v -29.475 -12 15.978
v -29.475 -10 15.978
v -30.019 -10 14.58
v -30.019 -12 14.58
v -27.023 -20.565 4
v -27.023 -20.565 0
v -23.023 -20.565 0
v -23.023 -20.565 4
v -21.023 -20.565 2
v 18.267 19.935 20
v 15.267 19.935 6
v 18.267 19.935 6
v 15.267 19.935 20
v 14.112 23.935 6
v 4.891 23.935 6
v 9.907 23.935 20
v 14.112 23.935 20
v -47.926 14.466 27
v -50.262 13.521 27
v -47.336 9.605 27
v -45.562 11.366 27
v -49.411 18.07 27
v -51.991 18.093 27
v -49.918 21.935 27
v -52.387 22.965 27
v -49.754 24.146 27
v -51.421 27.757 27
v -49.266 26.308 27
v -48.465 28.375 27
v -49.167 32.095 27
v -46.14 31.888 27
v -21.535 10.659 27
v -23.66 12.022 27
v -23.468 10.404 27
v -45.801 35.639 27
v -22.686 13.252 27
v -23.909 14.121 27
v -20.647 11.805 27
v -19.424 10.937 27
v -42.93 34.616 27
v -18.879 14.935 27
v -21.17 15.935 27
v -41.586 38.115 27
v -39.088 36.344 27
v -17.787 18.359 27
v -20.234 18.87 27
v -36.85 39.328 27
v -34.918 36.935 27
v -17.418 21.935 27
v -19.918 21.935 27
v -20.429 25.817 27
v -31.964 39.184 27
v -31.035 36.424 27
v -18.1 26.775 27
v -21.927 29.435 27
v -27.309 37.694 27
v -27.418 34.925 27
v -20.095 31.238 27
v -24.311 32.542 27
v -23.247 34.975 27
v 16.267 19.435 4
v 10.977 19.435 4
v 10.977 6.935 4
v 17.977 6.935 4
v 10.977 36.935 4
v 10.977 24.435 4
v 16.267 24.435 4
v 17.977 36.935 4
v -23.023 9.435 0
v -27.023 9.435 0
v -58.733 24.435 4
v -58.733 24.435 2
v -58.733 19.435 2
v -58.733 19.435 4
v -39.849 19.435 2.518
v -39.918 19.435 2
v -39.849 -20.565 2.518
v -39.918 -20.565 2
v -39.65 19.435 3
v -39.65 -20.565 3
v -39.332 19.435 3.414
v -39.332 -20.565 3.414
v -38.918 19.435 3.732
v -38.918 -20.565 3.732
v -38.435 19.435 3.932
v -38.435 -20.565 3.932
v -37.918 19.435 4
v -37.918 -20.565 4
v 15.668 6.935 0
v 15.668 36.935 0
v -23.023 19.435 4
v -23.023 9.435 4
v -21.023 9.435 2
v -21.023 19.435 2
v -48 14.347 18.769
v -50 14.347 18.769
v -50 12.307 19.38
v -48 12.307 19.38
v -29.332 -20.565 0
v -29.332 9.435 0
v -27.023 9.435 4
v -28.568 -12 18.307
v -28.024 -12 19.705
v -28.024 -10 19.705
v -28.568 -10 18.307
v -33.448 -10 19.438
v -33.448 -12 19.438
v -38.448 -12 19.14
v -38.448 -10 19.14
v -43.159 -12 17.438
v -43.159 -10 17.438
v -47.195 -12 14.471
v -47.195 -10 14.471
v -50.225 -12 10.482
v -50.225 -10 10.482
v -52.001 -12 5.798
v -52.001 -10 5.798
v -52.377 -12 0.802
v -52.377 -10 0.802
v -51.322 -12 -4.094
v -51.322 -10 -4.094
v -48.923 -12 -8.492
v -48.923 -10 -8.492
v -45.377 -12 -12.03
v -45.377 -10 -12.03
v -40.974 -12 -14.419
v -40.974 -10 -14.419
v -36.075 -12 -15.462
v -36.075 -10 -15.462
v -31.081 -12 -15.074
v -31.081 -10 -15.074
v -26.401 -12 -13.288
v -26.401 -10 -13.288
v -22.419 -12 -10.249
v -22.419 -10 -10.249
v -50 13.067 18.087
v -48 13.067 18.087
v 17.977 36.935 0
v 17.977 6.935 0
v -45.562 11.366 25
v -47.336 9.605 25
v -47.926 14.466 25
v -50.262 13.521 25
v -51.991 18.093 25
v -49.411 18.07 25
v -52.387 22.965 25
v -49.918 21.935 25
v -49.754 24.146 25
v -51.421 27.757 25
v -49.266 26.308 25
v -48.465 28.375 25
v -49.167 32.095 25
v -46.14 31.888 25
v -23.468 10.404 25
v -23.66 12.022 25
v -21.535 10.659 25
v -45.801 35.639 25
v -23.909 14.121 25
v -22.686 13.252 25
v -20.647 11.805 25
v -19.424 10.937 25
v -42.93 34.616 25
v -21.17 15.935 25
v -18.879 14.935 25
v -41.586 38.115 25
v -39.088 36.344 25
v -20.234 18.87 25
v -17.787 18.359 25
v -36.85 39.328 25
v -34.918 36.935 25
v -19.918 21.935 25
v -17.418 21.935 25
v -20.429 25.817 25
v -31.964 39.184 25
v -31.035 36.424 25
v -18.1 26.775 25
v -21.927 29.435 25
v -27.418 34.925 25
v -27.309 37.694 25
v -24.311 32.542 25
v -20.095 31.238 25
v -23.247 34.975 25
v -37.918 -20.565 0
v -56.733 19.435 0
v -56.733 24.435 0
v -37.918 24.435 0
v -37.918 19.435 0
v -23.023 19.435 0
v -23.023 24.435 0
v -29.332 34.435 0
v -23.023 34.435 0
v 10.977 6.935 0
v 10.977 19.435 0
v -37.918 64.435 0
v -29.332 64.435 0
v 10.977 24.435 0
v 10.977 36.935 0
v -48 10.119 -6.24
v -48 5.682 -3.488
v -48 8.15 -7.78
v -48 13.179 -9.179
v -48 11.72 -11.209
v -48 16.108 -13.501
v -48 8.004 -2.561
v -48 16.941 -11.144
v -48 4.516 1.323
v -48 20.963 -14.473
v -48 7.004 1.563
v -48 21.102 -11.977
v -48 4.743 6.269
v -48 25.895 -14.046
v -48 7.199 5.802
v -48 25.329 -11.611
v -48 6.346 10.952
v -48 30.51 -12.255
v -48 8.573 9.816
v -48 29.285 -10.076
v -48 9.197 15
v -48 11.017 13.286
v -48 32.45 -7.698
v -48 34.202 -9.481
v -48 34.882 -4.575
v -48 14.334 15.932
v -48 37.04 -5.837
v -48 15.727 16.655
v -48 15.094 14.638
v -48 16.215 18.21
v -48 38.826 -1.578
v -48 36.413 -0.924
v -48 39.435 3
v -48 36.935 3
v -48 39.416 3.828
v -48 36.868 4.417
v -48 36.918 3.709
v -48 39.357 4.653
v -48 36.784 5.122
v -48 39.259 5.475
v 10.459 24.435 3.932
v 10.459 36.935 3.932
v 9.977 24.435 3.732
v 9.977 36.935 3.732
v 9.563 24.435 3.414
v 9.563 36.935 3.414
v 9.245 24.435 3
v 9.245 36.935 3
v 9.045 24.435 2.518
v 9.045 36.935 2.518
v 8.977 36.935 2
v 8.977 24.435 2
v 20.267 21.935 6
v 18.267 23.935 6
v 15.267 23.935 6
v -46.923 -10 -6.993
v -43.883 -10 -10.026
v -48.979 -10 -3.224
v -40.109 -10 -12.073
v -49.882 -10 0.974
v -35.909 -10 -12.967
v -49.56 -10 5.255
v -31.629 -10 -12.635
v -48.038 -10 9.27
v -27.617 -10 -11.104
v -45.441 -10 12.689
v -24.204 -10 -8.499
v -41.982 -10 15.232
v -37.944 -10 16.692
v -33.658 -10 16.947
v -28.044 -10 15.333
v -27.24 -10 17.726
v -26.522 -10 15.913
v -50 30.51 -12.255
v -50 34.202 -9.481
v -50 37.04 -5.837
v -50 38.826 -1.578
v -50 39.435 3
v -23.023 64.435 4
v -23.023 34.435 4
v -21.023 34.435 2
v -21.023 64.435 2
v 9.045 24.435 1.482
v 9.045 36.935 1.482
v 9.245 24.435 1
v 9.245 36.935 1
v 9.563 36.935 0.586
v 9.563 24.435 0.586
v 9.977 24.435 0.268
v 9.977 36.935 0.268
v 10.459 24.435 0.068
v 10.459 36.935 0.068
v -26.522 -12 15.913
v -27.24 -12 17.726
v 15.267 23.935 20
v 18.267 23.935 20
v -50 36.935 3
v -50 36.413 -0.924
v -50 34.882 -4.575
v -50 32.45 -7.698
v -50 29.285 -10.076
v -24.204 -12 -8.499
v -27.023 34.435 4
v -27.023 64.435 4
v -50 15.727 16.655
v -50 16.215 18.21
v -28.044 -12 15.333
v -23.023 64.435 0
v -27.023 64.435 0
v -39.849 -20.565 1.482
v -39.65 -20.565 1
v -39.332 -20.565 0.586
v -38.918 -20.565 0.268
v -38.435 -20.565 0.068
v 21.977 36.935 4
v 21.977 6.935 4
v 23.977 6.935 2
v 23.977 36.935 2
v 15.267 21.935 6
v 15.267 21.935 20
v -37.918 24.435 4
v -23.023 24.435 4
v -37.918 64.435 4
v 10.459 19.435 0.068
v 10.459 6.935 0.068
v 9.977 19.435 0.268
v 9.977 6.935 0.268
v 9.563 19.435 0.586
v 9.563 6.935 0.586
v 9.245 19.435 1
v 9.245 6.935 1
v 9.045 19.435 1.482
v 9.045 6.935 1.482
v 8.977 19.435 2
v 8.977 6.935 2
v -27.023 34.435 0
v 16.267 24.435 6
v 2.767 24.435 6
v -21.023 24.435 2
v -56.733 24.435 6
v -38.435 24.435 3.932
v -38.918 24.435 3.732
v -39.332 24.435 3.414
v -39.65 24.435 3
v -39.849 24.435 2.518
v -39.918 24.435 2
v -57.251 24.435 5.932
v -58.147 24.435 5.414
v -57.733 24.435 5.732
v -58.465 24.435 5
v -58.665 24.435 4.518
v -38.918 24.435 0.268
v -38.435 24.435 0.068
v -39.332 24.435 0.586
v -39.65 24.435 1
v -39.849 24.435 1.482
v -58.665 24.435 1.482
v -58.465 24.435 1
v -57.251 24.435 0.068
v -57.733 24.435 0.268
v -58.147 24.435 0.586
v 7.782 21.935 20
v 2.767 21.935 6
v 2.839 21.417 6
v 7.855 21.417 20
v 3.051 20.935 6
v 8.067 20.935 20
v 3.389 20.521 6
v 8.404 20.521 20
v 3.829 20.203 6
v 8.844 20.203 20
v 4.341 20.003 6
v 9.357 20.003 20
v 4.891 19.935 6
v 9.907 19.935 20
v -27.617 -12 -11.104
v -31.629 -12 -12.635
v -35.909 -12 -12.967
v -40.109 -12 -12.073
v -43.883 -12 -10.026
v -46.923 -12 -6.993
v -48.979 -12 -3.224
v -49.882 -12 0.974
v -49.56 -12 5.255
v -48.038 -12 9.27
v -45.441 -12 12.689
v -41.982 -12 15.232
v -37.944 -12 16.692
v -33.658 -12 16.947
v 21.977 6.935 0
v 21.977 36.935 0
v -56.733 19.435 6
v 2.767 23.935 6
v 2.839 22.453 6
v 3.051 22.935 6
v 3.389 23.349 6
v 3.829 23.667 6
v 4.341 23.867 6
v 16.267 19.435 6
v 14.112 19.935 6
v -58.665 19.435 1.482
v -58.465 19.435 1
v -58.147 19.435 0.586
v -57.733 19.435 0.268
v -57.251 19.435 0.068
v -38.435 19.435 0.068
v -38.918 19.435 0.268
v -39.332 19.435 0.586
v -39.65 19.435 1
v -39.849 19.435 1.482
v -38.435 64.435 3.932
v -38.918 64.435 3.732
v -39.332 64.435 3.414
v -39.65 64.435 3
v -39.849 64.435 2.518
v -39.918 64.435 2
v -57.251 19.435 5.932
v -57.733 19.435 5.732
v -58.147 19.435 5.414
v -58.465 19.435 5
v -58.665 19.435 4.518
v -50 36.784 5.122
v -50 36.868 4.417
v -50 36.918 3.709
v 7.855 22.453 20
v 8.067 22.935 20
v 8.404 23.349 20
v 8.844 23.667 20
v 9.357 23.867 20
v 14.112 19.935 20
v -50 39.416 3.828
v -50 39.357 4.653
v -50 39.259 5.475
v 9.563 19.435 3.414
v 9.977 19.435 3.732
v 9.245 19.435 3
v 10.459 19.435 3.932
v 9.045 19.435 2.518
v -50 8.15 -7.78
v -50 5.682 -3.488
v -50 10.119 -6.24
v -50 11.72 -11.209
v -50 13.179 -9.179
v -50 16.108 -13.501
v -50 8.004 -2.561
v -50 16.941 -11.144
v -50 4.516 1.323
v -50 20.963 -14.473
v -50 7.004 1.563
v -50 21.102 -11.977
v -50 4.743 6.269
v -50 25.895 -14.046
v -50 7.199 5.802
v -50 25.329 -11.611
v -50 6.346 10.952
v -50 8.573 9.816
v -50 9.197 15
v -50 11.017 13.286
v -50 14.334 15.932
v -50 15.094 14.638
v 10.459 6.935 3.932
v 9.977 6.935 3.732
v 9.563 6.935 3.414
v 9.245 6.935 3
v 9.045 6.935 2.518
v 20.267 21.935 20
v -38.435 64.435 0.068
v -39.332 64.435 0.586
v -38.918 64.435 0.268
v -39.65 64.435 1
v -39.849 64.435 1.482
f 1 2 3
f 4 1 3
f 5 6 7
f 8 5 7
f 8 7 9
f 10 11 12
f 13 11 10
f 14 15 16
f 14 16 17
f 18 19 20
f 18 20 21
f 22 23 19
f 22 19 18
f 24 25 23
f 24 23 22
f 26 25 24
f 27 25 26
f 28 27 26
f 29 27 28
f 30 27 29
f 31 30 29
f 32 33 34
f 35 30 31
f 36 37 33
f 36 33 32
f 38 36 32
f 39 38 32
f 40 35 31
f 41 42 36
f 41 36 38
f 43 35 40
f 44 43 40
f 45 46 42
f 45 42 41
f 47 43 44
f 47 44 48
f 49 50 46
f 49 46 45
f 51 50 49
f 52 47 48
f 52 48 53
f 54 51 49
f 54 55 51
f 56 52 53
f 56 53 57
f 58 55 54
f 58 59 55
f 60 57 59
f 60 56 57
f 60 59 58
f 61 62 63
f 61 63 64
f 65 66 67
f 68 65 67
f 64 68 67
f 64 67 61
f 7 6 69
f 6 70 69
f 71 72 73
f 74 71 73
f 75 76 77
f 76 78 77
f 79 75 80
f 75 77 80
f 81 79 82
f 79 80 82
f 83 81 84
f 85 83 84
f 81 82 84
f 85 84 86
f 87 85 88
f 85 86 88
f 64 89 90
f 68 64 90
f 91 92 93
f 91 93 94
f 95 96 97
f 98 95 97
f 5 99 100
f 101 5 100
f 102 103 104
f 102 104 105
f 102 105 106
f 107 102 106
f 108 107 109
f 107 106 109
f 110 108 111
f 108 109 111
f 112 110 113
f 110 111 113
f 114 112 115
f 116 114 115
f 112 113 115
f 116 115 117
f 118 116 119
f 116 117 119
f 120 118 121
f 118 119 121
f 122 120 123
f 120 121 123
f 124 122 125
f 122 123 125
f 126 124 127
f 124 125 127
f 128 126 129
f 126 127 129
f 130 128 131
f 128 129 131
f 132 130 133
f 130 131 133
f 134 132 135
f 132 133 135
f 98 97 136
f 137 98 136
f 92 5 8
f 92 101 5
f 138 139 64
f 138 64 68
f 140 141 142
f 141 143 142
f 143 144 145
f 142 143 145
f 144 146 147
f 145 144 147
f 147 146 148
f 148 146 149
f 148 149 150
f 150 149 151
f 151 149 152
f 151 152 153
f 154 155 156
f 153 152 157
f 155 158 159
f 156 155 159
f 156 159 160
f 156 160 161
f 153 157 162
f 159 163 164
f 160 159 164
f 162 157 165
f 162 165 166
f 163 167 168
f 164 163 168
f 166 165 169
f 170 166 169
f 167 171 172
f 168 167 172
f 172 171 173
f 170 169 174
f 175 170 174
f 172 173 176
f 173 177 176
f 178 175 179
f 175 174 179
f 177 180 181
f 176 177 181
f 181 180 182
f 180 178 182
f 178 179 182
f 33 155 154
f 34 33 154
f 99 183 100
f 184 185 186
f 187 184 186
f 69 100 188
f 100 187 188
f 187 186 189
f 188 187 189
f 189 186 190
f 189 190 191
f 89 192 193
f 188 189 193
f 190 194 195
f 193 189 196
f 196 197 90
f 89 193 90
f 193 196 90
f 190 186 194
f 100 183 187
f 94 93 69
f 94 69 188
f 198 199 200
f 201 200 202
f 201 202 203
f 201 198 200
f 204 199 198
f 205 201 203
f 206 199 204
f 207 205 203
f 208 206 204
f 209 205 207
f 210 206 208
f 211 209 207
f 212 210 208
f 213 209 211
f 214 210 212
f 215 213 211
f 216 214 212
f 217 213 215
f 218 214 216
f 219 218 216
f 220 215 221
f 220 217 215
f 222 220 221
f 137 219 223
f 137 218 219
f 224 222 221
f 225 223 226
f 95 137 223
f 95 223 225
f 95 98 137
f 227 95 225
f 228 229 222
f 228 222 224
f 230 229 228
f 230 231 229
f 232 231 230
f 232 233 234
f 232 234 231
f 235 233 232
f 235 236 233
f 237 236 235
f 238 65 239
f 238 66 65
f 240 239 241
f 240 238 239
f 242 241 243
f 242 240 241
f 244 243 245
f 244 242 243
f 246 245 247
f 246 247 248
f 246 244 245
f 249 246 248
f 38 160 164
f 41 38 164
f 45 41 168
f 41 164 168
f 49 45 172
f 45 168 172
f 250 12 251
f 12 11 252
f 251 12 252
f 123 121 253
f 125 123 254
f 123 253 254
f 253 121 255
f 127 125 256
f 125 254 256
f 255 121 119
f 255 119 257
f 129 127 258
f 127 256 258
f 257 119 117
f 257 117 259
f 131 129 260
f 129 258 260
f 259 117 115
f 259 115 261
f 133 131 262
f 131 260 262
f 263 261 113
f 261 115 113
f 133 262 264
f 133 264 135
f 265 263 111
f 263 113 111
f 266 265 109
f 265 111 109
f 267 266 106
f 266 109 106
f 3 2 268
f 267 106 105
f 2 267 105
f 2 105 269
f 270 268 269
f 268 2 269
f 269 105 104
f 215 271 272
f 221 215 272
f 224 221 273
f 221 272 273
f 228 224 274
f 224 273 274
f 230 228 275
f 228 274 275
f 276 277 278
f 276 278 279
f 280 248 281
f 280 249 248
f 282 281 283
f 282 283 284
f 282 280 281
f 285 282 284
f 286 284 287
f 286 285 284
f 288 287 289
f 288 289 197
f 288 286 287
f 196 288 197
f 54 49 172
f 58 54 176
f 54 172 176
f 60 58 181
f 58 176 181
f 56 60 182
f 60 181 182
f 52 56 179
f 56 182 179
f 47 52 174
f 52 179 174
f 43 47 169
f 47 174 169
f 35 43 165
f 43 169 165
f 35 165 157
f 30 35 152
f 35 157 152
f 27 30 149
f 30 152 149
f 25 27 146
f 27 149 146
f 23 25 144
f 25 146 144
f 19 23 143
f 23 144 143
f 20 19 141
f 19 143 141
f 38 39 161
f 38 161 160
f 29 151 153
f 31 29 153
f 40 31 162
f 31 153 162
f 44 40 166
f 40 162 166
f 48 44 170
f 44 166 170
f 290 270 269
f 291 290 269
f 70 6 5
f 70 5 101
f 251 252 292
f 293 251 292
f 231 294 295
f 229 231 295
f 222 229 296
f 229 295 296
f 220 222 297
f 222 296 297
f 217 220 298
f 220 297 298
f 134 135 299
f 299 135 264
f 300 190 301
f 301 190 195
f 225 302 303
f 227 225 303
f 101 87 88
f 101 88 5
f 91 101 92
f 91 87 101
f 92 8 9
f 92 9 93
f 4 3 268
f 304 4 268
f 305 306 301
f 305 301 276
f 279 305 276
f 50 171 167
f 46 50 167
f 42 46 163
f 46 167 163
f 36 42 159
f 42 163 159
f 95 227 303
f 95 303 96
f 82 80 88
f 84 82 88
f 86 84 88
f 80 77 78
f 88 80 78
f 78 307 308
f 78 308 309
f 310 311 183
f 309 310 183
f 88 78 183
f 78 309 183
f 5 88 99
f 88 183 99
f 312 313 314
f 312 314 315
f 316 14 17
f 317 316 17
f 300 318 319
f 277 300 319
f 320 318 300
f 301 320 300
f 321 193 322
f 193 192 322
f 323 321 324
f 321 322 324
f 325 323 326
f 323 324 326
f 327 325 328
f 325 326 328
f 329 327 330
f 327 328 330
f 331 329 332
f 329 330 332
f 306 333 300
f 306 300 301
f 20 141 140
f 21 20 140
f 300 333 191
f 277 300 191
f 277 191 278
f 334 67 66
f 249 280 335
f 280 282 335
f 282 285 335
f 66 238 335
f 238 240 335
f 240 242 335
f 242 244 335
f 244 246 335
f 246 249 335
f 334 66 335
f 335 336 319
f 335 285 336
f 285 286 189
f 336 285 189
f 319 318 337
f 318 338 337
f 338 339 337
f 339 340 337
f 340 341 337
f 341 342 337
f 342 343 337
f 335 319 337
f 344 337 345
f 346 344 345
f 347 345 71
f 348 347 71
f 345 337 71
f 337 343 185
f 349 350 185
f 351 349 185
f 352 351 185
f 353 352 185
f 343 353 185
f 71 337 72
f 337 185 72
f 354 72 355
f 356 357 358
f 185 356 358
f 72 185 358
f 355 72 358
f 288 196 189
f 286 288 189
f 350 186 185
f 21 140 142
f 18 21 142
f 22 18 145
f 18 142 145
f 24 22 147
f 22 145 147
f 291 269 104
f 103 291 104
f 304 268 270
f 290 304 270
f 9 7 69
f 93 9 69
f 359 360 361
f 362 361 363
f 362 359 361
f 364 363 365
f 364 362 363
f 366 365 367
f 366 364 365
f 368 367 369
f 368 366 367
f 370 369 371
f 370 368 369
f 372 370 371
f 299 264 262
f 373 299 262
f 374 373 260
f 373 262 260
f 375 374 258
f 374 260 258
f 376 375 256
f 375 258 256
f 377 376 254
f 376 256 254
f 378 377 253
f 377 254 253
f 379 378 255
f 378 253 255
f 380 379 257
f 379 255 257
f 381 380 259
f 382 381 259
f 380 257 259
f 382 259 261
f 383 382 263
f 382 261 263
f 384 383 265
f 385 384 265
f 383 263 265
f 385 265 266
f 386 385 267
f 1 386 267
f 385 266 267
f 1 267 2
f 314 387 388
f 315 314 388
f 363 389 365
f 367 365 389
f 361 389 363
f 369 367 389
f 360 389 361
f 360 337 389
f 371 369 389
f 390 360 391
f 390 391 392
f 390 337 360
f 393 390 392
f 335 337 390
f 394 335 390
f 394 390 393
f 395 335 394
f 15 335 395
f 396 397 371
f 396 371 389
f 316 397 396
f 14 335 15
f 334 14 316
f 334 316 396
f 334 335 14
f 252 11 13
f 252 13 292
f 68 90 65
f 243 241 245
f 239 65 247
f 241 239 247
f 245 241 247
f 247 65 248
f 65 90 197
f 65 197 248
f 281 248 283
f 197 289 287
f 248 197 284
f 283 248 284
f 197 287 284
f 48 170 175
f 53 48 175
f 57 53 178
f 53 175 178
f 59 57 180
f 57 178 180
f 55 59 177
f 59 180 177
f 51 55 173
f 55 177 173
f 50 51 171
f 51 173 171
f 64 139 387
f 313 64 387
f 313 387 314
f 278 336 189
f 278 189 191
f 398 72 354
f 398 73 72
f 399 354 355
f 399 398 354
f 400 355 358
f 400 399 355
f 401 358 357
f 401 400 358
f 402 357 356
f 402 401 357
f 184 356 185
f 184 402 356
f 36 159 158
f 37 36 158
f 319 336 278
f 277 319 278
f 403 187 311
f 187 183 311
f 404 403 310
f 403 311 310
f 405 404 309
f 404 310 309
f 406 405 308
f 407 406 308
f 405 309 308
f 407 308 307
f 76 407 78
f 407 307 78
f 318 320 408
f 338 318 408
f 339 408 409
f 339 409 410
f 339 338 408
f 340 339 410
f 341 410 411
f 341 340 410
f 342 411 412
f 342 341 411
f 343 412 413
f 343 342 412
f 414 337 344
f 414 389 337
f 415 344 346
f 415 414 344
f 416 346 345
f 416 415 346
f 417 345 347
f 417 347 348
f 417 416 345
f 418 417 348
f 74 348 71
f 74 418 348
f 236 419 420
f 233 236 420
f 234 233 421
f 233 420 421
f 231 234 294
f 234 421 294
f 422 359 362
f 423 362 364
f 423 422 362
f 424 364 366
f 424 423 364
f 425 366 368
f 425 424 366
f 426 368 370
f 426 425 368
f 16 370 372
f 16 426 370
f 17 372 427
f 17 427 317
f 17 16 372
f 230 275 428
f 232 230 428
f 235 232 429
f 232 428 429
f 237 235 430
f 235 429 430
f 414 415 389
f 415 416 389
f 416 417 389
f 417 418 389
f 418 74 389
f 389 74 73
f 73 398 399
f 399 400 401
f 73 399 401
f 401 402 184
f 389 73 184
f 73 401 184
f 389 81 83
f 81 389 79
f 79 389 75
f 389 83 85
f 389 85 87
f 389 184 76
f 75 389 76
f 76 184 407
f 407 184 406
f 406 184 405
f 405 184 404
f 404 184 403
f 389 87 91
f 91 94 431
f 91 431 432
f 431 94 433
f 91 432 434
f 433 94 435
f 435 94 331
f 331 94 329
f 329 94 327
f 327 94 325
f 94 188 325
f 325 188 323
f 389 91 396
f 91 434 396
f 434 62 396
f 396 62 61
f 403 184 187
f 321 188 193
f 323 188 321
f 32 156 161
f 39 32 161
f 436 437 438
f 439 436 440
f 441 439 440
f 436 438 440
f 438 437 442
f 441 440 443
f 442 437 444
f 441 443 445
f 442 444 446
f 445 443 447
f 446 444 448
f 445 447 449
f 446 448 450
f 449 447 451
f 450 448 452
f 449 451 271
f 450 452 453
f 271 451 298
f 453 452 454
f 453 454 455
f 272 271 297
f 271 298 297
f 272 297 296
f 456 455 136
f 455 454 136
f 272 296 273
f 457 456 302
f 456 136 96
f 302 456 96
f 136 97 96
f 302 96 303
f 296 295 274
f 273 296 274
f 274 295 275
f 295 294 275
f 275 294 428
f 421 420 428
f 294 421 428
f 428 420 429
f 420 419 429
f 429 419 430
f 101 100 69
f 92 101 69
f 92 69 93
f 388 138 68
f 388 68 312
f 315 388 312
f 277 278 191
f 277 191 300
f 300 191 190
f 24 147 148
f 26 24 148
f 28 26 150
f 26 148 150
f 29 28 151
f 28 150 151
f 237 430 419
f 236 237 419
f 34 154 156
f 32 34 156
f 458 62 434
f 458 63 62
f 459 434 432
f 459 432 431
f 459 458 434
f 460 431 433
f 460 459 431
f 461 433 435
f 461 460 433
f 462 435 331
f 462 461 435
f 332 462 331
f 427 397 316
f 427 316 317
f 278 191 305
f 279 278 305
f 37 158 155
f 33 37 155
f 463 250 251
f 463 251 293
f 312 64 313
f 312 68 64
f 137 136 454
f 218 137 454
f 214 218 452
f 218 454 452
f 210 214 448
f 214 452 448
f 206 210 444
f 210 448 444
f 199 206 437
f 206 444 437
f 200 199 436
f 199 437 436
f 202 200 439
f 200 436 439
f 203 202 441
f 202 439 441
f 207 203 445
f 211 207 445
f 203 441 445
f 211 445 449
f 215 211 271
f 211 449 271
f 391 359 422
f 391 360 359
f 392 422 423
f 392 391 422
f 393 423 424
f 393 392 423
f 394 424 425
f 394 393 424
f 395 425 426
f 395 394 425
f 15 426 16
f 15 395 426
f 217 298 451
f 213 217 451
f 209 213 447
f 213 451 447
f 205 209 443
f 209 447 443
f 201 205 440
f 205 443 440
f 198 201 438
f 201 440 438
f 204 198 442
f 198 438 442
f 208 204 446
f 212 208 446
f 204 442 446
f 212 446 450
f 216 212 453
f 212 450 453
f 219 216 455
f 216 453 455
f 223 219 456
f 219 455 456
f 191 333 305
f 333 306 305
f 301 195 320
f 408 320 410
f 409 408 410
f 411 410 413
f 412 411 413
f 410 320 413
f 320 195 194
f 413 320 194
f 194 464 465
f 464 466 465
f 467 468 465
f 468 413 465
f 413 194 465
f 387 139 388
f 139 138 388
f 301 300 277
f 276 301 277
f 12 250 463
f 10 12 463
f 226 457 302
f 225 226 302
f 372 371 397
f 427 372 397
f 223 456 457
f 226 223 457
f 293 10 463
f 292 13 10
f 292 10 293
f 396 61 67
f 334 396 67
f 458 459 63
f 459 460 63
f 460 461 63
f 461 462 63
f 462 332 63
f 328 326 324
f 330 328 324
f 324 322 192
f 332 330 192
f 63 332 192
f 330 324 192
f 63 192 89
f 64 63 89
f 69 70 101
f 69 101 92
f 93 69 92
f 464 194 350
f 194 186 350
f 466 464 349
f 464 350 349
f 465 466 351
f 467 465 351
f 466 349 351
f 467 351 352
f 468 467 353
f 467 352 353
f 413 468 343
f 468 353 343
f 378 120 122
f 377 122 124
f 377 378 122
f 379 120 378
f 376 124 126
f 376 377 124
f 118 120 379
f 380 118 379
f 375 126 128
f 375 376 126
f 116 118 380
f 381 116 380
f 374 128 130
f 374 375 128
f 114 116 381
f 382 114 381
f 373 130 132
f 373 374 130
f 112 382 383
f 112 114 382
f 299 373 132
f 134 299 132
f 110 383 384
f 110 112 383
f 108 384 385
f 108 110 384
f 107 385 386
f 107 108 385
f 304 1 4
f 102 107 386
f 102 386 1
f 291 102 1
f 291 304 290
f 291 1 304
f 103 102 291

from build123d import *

# Parameters (mm, degrees)
F0_W        = 12.5
F0_H        = 4
F1_DEPTH    = 6
F2_DEPTH    = 4
F0_W_2      = 6
F0_H_2      = 30
F3_DEPTH    = 4
F4_DEPTH    = 20
F7_DEPTH    = 25
F8_DEPTH    = 5
F9_R        = 1.99999
F10_SIZE    = 1.99999
F10_2_SIZE  = 1.99999
F10_3_SIZE  = 1.99999
F10_4_SIZE  = 1.99999
F10_5_SIZE  = 1.99999
F11_SIZE2   = 2.309391
F11_SIZE    = 3.99999
F11_2_SIZE2 = 2.309391
F11_2_SIZE  = 3.99999
F11_3_SIZE2 = 2.309391
F11_3_SIZE  = 3.99999
F12_SIZE2   = 1.154691
F12_SIZE    = 1.99999
F15_DEPTH   = 2
F18_DEPTH   = 2
F21_DEPTH   = 2


# Not quite as in the source:
# - a fillet or chamfer is up to 0.001 mm smaller than in the source, because OpenCascade refuses the exact size


with BuildPart() as f1:
    # F0 (on Top) → F1 (new body)
    with BuildSketch(Plane.XY):
        Polygon((-58.7332326337, 24.4351043343), (-58.7332326337, 19.4351043343), (-39.9175214512, 19.4351043343), (-21.0230639726, 19.4351043343), (8.9769360274, 19.4351043343), (16.2667673663, 19.4351043343), (16.2667673663, 24.4351043343), (8.9769360274, 24.4351043343), (-21.0230639726, 24.4351043343), (-39.9175214512, 24.4351043343), align=None)
        with Locations((9.0167673663, 21.9351043343)):
            Rectangle(F0_W, F0_H, mode=Mode.SUBTRACT)
    extrude(amount=F1_DEPTH)

    # F0 (on Top) → F2 (join)
    with BuildSketch(Plane.XY):
        Polygon((-21.0230639726, 19.4351043343), (-39.9175214512, 19.4351043343), (-39.9175214512, -20.5648956657), (-27.0230639726, -20.5648956657), (-27.0230639726, 9.4351043343), (-21.0230639726, 9.4351043343), align=None)
        Polygon((-39.9175214512, 64.4351043343), (-39.9175214512, 24.4351043343), (-21.0230639726, 24.4351043343), (-21.0230639726, 34.4351043343), (-27.0230639726, 34.4351043343), (-27.0230639726, 64.4351043343), align=None)
        Polygon((16.2667673663, 19.4351043343), (8.9769360274, 19.4351043343), (8.9769360274, 6.9351043343), (17.9769360274, 6.9351043343), (17.9769360274, 36.9351043343), (8.9769360274, 36.9351043343), (8.9769360274, 24.4351043343), (16.2667673663, 24.4351043343), align=None)
    extrude(amount=F2_DEPTH)

    # F0 (on Top) → F4 (join)
    with BuildSketch(Plane.XY):
        with Locations((9.0167673663, 21.9351043343)):
            Rectangle(F0_W, F0_H)
    extrude(amount=F4_DEPTH)

    # F6 (on offset) → F7 (cut)
    with BuildSketch(Plane.XZ.offset(-19.9351043343)):
        Polygon((7.7822105959, 20), (2.7667673663, 20), (2.7667673663, 6), align=None)
    extrude(amount=-F7_DEPTH, mode=Mode.SUBTRACT)


with BuildPart() as f3:
    # F0 (on Top) → F3 (new body)
    with BuildSketch(Plane.XY):
        with Locations((-24.0230639726, -5.5648956657)):
            Rectangle(F0_W_2, F0_H_2)
    extrude(amount=F3_DEPTH)

    # F10#2 (size 2 in the source; OpenCascade refuses exactly that, so slightly less here)
    f10_2_edges = [f3.edges().sort_by_distance(p)[0] for p in [
        (-21.023064, -5.564896, 4),
        (-21.023064, -5.564896, 0),
    ]]
    chamfer(f10_2_edges, length=F10_2_SIZE)


with BuildPart() as f3b:
    # F0 (on Top) → F3, piece 2 (new body)
    with BuildSketch(Plane.XY):
        with Locations((-24.0230639726, 49.4351043343)):
            Rectangle(F0_W_2, F0_H_2)
    extrude(amount=F3_DEPTH)

    # F10#3 (size 2 in the source; OpenCascade refuses exactly that, so slightly less here)
    f10_3_edges = [f3b.edges().sort_by_distance(p)[0] for p in [
        (-21.023064, 49.435104, 4),
        (-21.023064, 49.435104, 0),
    ]]
    chamfer(f10_3_edges, length=F10_3_SIZE)


with BuildPart() as f3c:
    # F0 (on Top) → F3, piece 3 (new body)
    with BuildSketch(Plane.XY):
        with Locations((20.9769360274, 21.9351043343)):
            Rectangle(F0_W_2, F0_H_2)
    extrude(amount=F3_DEPTH)

    # F10#4 (size 2 in the source; OpenCascade refuses exactly that, so slightly less here)
    f10_4_edges = [f3c.edges().sort_by_distance(p)[0] for p in [
        (23.976936, 21.935104, 4),
        (23.976936, 21.935104, 0),
    ]]
    chamfer(f10_4_edges, length=F10_4_SIZE)


with BuildPart() as f8:
    # F8 (new): a face of the model
    f8_faces = [f1.part.faces().sort_by_distance(p)[0] for p in [
        (15.2667673663, 21.9351043343, 13),
    ]]
    extrude(f8_faces, amount=F8_DEPTH)

    # F10#5 (size 2 in the source; OpenCascade refuses exactly that, so slightly less here)
    f10_5_edges = [f8.edges().sort_by_distance(p)[0] for p in [
        (20.266767, 19.935104, 13),
        (20.266767, 23.935104, 13),
    ]]
    chamfer(f10_5_edges, length=F10_5_SIZE)


with BuildPart() as f1_1:
    add(f1.part)

    # F9 (radius 2 in the source; OpenCascade refuses exactly that, so slightly less here)
    f9_edges = [f1_1.edges().sort_by_distance(p)[0] for p in [
        (-39.917521, -0.564896, 4),
        (-39.917521, 44.435104, 4),
        (8.976936, 13.185104, 4),
        (-39.917521, -0.564896, 0),
        (-39.917521, 44.435104, 0),
        (8.976936, 13.185104, 0),
        (-58.733233, 21.935104, 6),
        (-58.733233, 21.935104, 0),
        (8.976936, 30.685104, 4),
        (8.976936, 30.685104, 0),
        (5.274489, 19.935104, 13),
        (5.274489, 23.935104, 13),
    ]]
    fillet(f9_edges, radius=F9_R)

    # F10 (size 2 in the source; OpenCascade refuses exactly that, so slightly less here)
    f10_edges = [f1_1.edges().sort_by_distance(p)[0] for p in [
        (-21.023064, 14.435104, 4),
        (-21.023064, 29.435104, 4),
        (-21.023064, 14.435104, 0),
        (-21.023064, 29.435104, 0),
    ]]
    chamfer(f10_edges, length=F10_SIZE)

    # F11 (size 4 and 2.3094010768 in the source; OpenCascade refuses exactly that, so slightly less here)
    f11_edges = [f1_1.edges().sort_by_distance(p)[0] for p in [
        (-27.023064, -5.564896, 0),
    ]]
    f11_side = f1_1.faces().sort_by_distance((-27.023064, -5.564896, 2))[0]
    chamfer(f11_edges, length=F11_SIZE, length2=F11_SIZE2, reference=f11_side)

    # F11#2 (size 4 and 2.3094010768 in the source; OpenCascade refuses exactly that, so slightly less here)
    f11_2_edges = [f1_1.edges().sort_by_distance(p)[0] for p in [
        (-27.023064, 49.435104, 0),
    ]]
    f11_2_side = f1_1.faces().sort_by_distance((-27.023064, 49.435104, 2))[0]
    chamfer(f11_2_edges, length=F11_2_SIZE, length2=F11_2_SIZE2, reference=f11_2_side)

    # F11#3 (size 4 and 2.3094010768 in the source; OpenCascade refuses exactly that, so slightly less here)
    f11_3_edges = [f1_1.edges().sort_by_distance(p)[0] for p in [
        (17.976936, 21.935104, 0),
    ]]
    f11_3_side = f1_1.faces().sort_by_distance((17.976936, 21.935104, 2))[0]
    chamfer(f11_3_edges, length=F11_3_SIZE, length2=F11_3_SIZE2, reference=f11_3_side)

    # F12 (size 2 and 1.1547005384 in the source; OpenCascade refuses exactly that, so slightly less here)
    f12_edges = [f1_1.edges().sort_by_distance(p)[0] for p in [
        (15.266767, 19.935104, 13),
        (15.266767, 23.935104, 13),
    ]]
    f12_side = f1_1.faces().sort_by_distance((15.266767, 21.935104, 13))[0]
    chamfer(f12_edges, length=F12_SIZE, length2=F12_SIZE2, reference=f12_side)


with BuildPart() as f15:
    # F14 (on offset) → F15 (new body)
    with BuildSketch(Plane.YZ.offset(-50)):
        with BuildLine():
            Line((30.5101656349, -12.2551081179), (29.2851568777, -10.0758069582))
            ThreePointArc((29.2851568777, -10.0758069582), (8.9307815246, -4.4758001753), (14.3342516917, 15.9316294065))
            Line((14.3342516917, 15.9316294065), (13.0674429179, 18.0869009742))
            ThreePointArc((13.0674429179, 18.0869009742), (6.7633943897, -5.7217668712), (30.5101656349, -12.2551081179))
        make_face()
        with BuildLine():
            ThreePointArc((14.3342516917, 15.9316294065), (15.0210934818, 16.311515839), (15.7268663052, 16.6549544333))
            Line((15.7268663052, 16.6549544333), (16.2145903627, 18.2098067016))
            Line((16.2145903627, 18.2098067016), (14.3468390864, 18.769217816))
            ThreePointArc((14.3468390864, 18.769217816), (13.7000712643, 18.4413156932), (13.0674429179, 18.0869009742))
            Line((13.0674429179, 18.0869009742), (14.3342516917, 15.9316294065))
        make_face()
        with BuildLine():
            Line((14.3342516917, 15.9316294065), (15.094336956, 14.6384664658))
            Line((15.094336956, 14.6384664658), (15.7268663052, 16.6549544333))
            ThreePointArc((15.7268663052, 16.6549544333), (15.0210934818, 16.311515839), (14.3342516917, 15.9316294065))
        make_face()
        with BuildLine():
            ThreePointArc((13.0674429179, 18.0869009742), (13.7000712643, 18.4413156932), (14.3468390864, 18.769217816))
            Line((14.3468390864, 18.769217816), (12.3073576537, 19.3800639148))
            Line((12.3073576537, 19.3800639148), (13.0674429179, 18.0869009742))
        make_face()
        with BuildLine():
            Line((39.259186316, 5.4751128239), (36.7843174615, 5.1215252776))
            ThreePointArc((36.7843174615, 5.1215252776), (36.8973601286, 4.0634385484), (36.9351043343, 3))
            ThreePointArc((36.9351043343, 3), (34.8821269293, -4.5746026909), (29.2851568777, -10.0758069582))
            Line((29.2851568777, -10.0758069582), (30.5101656349, -12.2551081179))
            ThreePointArc((30.5101656349, -12.2551081179), (37.0399640285, -5.8370364727), (39.4351043343, 3))
            ThreePointArc((39.4351043343, 3), (39.3910694276, 4.2406783064), (39.259186316, 5.4751128239))
        make_face()
    extrude(amount=F15_DEPTH)


with BuildPart() as f18:
    # F17 (on offset) → F18 (new body)
    with BuildSketch(Plane.XZ.offset(10)):
        with BuildLine():
            Line((-22.4187029305, -10.2486544399), (-24.2042484335, -8.4988466628))
            ThreePointArc((-24.2042484335, -8.4988466628), (-49.5813990611, -1.1576404862), (-29.4749108405, 15.9777676952))
            Line((-29.4749108405, 15.9777676952), (-28.5678090721, 18.3073956444))
            ThreePointArc((-28.5678090721, 18.3073956444), (-52.0253786628, -1.6839139005), (-22.4187029305, -10.2486544399))
        make_face()
        with BuildLine():
            Line((-28.5678090721, 18.3073956444), (-29.4749108405, 15.9777676952))
            ThreePointArc((-29.4749108405, 15.9777676952), (-28.751203924, 15.6739360886), (-28.0443808054, 15.3326643123))
            Line((-28.0443808054, 15.3326643123), (-26.5216797206, 15.9130277666))
            Line((-26.5216797206, 15.9130277666), (-27.2396089112, 17.7257641795))
            ThreePointArc((-27.2396089112, 17.7257641795), (-27.8976824924, 18.0303418863), (-28.5678090721, 18.3073956444))
        make_face()
        with BuildLine():
            ThreePointArc((-28.0443808054, 15.3326643123), (-28.751203924, 15.6739360886), (-29.4749108405, 15.9777676952))
            Line((-29.4749108405, 15.9777676952), (-30.0191719016, 14.5799909257))
            Line((-30.0191719016, 14.5799909257), (-28.0443808054, 15.3326643123))
        make_face()
        with BuildLine():
            Line((-28.023548011, 19.7051724139), (-28.5678090721, 18.3073956444))
            ThreePointArc((-28.5678090721, 18.3073956444), (-27.8976824924, 18.0303418863), (-27.2396089112, 17.7257641795))
            Line((-27.2396089112, 17.7257641795), (-28.023548011, 19.7051724139))
        make_face()
    extrude(amount=F18_DEPTH)


with BuildPart() as f21:
    # F20 (on offset) → F21 (new body)
    with BuildSketch(Plane.XY.offset(25)):
        with BuildLine():
            ThreePointArc((-34.9175214512, 39.4351043343), (-44.2654551052, 36.729229398), (-50.7226071157, 29.4483770657))
            Line((-50.7226071157, 29.4483770657), (-48.4647377351, 28.3750523898))
            ThreePointArc((-48.4647377351, 28.3750523898), (-42.9300360118, 34.6157829603), (-34.9175214512, 36.9351043343))
            Line((-34.9175214512, 36.9351043343), (-34.9175214512, 39.4351043343))
        make_face()
        with BuildLine():
            Line((-22.686037665, 13.2523165108), (-23.9091860436, 14.1205952931))
            Line((-23.9091860436, 14.1205952931), (-23.6600991667, 12.0219593484))
            ThreePointArc((-23.6600991667, 12.0219593484), (-23.1569678169, 12.6243912459), (-22.686037665, 13.2523165108))
        make_face()
        with BuildLine():
            Line((-23.4680358856, 10.4037652844), (-21.5350369428, 10.6586195813))
            ThreePointArc((-21.5350369428, 10.6586195813), (-21.0793669968, 11.2227058495), (-20.6474570339, 11.8051852068))
            Line((-20.6474570339, 11.8051852068), (-22.686037665, 13.2523165108))
            ThreePointArc((-22.686037665, 13.2523165108), (-23.1569678169, 12.6243912459), (-23.6600991667, 12.0219593484))
            Line((-23.6600991667, 12.0219593484), (-23.4680358856, 10.4037652844))
        make_face()
        with BuildLine():
            ThreePointArc((-20.6474570339, 11.8051852068), (-21.0793669968, 11.2227058495), (-21.5350369428, 10.6586195813))
            Line((-21.5350369428, 10.6586195813), (-19.4243086553, 10.9369064245))
            Line((-19.4243086553, 10.9369064245), (-20.6474570339, 11.8051852068))
        make_face()
        with BuildLine():
            ThreePointArc((-50.7226071157, 29.4483770657), (-52.168080783, 18.9909231681), (-47.3358865818, 9.6048891098))
            Line((-47.3358865818, 9.6048891098), (-45.5618344203, 11.3663484276))
            ThreePointArc((-45.5618344203, 11.3663484276), (-48.7859152755, 16.2195420057), (-49.9175214512, 21.9351043343))
            ThreePointArc((-49.9175214512, 21.9351043343), (-49.5498186778, 25.2359948006), (-48.4647377351, 28.3750523898))
            Line((-48.4647377351, 28.3750523898), (-50.7226071157, 29.4483770657))
        make_face()
        with BuildLine():
            Line((-34.9175214512, 39.4351043343), (-34.9175214512, 36.9351043343))
            ThreePointArc((-34.9175214512, 36.9351043343), (-24.3109197334, 32.5417060521), (-19.9175214512, 21.9351043343))
            ThreePointArc((-19.9175214512, 21.9351043343), (-20.6264008374, 17.3783651928), (-22.686037665, 13.2523165108))
            Line((-22.686037665, 13.2523165108), (-20.6474570339, 11.8051852068))
            ThreePointArc((-20.6474570339, 11.8051852068), (-18.2445474018, 16.6189086692), (-17.4175214512, 21.9351043343))
            ThreePointArc((-17.4175214512, 21.9351043343), (-22.5431527804, 34.309473005), (-34.9175214512, 39.4351043343))
        make_face()
    extrude(amount=F21_DEPTH)


solid = Compound([f3.part, f3b.part, f3c.part, f8.part, f1_1.part, f15.part, f18.part, f21.part])
